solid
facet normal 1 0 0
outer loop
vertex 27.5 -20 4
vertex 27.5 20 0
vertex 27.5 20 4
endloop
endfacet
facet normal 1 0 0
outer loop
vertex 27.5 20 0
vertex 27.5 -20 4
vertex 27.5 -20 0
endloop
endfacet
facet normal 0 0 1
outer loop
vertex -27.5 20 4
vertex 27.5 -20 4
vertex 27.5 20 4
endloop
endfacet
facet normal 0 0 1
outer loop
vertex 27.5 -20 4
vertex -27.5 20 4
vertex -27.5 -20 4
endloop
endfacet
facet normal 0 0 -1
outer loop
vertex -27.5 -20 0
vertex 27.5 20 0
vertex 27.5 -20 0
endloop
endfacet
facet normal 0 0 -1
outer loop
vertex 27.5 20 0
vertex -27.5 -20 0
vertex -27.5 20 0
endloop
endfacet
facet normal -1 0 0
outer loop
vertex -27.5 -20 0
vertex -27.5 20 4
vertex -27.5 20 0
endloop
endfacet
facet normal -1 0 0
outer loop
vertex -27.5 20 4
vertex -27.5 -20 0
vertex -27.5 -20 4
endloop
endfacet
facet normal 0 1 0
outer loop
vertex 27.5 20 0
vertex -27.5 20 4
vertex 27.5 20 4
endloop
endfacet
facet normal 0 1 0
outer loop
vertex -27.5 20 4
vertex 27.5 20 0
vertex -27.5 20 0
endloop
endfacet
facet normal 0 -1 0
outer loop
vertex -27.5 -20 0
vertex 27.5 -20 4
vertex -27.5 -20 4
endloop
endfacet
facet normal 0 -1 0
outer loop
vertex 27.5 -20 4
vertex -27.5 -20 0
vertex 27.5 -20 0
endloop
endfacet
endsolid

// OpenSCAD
// title: Lid 55x40 for 60x45 box, press-on rim

// ---- top variable block (all dimensions & FDM tolerances) ----
box_inner_width       = 60;   // box inside width  (W) - user given
box_inner_depth       = 45;   // box inside depth  (D) - user given
lid_width             = 55;   // lid top width     (W) - user given
lid_depth             = 40;   // lid top depth     (D) - user given
wall_thickness        = 3;    // lid wall thickness (mm) - assumed, sturdy rim
lid_base_thickness    = 4;    // top plate thickness (H) - assumed
rim_drop              = 2;    // how deep the rim sinks into the box (H) - assumed press-fit
rim_width             = 5;    // outer rim band width (W/D) - assumed
skirt_height          = 5;    // outer skirt drop height (H) - assumed
fillet_size_top       = 1.5;  // rounded top edge fillet (mm) - assumed

// ---- derived ----
skirt_width = lid_width + 2*rim_width; // 65
skirt_depth = lid_depth + 2*rim_width; // 50
base_height = lid_base_thickness + rim_drop; // 6 (top plate + rim sinking into box)
skirt_total_height = base_height + skirt_height; // 11
top_plate_height = lid_base_thickness; // 4

// ---- geometry (union: top plate + rim skirt), rounded top edge ----
difference() {
  // top plate (full lid footprint, sits above the rim)
  translate([0, 0, rim_drop])
    cube([lid_width, lid_depth, top_plate_height], center=true);

  // outer skirt band dropping around the box
  translate([0, 0, -skirt_height/2])
    difference() {
      cube([skirt_width, skirt_depth, skirt_height], center=true);
      // hollow out the inside so it is a rim, not a solid block
      translate([0, 0, -1])
        cube([lid_width, lid_depth, skirt_height + 2], center=true);
    }
}

// rounded top edge: apply fillet along the four vertical top edges via hull trick
$fn = 48;
